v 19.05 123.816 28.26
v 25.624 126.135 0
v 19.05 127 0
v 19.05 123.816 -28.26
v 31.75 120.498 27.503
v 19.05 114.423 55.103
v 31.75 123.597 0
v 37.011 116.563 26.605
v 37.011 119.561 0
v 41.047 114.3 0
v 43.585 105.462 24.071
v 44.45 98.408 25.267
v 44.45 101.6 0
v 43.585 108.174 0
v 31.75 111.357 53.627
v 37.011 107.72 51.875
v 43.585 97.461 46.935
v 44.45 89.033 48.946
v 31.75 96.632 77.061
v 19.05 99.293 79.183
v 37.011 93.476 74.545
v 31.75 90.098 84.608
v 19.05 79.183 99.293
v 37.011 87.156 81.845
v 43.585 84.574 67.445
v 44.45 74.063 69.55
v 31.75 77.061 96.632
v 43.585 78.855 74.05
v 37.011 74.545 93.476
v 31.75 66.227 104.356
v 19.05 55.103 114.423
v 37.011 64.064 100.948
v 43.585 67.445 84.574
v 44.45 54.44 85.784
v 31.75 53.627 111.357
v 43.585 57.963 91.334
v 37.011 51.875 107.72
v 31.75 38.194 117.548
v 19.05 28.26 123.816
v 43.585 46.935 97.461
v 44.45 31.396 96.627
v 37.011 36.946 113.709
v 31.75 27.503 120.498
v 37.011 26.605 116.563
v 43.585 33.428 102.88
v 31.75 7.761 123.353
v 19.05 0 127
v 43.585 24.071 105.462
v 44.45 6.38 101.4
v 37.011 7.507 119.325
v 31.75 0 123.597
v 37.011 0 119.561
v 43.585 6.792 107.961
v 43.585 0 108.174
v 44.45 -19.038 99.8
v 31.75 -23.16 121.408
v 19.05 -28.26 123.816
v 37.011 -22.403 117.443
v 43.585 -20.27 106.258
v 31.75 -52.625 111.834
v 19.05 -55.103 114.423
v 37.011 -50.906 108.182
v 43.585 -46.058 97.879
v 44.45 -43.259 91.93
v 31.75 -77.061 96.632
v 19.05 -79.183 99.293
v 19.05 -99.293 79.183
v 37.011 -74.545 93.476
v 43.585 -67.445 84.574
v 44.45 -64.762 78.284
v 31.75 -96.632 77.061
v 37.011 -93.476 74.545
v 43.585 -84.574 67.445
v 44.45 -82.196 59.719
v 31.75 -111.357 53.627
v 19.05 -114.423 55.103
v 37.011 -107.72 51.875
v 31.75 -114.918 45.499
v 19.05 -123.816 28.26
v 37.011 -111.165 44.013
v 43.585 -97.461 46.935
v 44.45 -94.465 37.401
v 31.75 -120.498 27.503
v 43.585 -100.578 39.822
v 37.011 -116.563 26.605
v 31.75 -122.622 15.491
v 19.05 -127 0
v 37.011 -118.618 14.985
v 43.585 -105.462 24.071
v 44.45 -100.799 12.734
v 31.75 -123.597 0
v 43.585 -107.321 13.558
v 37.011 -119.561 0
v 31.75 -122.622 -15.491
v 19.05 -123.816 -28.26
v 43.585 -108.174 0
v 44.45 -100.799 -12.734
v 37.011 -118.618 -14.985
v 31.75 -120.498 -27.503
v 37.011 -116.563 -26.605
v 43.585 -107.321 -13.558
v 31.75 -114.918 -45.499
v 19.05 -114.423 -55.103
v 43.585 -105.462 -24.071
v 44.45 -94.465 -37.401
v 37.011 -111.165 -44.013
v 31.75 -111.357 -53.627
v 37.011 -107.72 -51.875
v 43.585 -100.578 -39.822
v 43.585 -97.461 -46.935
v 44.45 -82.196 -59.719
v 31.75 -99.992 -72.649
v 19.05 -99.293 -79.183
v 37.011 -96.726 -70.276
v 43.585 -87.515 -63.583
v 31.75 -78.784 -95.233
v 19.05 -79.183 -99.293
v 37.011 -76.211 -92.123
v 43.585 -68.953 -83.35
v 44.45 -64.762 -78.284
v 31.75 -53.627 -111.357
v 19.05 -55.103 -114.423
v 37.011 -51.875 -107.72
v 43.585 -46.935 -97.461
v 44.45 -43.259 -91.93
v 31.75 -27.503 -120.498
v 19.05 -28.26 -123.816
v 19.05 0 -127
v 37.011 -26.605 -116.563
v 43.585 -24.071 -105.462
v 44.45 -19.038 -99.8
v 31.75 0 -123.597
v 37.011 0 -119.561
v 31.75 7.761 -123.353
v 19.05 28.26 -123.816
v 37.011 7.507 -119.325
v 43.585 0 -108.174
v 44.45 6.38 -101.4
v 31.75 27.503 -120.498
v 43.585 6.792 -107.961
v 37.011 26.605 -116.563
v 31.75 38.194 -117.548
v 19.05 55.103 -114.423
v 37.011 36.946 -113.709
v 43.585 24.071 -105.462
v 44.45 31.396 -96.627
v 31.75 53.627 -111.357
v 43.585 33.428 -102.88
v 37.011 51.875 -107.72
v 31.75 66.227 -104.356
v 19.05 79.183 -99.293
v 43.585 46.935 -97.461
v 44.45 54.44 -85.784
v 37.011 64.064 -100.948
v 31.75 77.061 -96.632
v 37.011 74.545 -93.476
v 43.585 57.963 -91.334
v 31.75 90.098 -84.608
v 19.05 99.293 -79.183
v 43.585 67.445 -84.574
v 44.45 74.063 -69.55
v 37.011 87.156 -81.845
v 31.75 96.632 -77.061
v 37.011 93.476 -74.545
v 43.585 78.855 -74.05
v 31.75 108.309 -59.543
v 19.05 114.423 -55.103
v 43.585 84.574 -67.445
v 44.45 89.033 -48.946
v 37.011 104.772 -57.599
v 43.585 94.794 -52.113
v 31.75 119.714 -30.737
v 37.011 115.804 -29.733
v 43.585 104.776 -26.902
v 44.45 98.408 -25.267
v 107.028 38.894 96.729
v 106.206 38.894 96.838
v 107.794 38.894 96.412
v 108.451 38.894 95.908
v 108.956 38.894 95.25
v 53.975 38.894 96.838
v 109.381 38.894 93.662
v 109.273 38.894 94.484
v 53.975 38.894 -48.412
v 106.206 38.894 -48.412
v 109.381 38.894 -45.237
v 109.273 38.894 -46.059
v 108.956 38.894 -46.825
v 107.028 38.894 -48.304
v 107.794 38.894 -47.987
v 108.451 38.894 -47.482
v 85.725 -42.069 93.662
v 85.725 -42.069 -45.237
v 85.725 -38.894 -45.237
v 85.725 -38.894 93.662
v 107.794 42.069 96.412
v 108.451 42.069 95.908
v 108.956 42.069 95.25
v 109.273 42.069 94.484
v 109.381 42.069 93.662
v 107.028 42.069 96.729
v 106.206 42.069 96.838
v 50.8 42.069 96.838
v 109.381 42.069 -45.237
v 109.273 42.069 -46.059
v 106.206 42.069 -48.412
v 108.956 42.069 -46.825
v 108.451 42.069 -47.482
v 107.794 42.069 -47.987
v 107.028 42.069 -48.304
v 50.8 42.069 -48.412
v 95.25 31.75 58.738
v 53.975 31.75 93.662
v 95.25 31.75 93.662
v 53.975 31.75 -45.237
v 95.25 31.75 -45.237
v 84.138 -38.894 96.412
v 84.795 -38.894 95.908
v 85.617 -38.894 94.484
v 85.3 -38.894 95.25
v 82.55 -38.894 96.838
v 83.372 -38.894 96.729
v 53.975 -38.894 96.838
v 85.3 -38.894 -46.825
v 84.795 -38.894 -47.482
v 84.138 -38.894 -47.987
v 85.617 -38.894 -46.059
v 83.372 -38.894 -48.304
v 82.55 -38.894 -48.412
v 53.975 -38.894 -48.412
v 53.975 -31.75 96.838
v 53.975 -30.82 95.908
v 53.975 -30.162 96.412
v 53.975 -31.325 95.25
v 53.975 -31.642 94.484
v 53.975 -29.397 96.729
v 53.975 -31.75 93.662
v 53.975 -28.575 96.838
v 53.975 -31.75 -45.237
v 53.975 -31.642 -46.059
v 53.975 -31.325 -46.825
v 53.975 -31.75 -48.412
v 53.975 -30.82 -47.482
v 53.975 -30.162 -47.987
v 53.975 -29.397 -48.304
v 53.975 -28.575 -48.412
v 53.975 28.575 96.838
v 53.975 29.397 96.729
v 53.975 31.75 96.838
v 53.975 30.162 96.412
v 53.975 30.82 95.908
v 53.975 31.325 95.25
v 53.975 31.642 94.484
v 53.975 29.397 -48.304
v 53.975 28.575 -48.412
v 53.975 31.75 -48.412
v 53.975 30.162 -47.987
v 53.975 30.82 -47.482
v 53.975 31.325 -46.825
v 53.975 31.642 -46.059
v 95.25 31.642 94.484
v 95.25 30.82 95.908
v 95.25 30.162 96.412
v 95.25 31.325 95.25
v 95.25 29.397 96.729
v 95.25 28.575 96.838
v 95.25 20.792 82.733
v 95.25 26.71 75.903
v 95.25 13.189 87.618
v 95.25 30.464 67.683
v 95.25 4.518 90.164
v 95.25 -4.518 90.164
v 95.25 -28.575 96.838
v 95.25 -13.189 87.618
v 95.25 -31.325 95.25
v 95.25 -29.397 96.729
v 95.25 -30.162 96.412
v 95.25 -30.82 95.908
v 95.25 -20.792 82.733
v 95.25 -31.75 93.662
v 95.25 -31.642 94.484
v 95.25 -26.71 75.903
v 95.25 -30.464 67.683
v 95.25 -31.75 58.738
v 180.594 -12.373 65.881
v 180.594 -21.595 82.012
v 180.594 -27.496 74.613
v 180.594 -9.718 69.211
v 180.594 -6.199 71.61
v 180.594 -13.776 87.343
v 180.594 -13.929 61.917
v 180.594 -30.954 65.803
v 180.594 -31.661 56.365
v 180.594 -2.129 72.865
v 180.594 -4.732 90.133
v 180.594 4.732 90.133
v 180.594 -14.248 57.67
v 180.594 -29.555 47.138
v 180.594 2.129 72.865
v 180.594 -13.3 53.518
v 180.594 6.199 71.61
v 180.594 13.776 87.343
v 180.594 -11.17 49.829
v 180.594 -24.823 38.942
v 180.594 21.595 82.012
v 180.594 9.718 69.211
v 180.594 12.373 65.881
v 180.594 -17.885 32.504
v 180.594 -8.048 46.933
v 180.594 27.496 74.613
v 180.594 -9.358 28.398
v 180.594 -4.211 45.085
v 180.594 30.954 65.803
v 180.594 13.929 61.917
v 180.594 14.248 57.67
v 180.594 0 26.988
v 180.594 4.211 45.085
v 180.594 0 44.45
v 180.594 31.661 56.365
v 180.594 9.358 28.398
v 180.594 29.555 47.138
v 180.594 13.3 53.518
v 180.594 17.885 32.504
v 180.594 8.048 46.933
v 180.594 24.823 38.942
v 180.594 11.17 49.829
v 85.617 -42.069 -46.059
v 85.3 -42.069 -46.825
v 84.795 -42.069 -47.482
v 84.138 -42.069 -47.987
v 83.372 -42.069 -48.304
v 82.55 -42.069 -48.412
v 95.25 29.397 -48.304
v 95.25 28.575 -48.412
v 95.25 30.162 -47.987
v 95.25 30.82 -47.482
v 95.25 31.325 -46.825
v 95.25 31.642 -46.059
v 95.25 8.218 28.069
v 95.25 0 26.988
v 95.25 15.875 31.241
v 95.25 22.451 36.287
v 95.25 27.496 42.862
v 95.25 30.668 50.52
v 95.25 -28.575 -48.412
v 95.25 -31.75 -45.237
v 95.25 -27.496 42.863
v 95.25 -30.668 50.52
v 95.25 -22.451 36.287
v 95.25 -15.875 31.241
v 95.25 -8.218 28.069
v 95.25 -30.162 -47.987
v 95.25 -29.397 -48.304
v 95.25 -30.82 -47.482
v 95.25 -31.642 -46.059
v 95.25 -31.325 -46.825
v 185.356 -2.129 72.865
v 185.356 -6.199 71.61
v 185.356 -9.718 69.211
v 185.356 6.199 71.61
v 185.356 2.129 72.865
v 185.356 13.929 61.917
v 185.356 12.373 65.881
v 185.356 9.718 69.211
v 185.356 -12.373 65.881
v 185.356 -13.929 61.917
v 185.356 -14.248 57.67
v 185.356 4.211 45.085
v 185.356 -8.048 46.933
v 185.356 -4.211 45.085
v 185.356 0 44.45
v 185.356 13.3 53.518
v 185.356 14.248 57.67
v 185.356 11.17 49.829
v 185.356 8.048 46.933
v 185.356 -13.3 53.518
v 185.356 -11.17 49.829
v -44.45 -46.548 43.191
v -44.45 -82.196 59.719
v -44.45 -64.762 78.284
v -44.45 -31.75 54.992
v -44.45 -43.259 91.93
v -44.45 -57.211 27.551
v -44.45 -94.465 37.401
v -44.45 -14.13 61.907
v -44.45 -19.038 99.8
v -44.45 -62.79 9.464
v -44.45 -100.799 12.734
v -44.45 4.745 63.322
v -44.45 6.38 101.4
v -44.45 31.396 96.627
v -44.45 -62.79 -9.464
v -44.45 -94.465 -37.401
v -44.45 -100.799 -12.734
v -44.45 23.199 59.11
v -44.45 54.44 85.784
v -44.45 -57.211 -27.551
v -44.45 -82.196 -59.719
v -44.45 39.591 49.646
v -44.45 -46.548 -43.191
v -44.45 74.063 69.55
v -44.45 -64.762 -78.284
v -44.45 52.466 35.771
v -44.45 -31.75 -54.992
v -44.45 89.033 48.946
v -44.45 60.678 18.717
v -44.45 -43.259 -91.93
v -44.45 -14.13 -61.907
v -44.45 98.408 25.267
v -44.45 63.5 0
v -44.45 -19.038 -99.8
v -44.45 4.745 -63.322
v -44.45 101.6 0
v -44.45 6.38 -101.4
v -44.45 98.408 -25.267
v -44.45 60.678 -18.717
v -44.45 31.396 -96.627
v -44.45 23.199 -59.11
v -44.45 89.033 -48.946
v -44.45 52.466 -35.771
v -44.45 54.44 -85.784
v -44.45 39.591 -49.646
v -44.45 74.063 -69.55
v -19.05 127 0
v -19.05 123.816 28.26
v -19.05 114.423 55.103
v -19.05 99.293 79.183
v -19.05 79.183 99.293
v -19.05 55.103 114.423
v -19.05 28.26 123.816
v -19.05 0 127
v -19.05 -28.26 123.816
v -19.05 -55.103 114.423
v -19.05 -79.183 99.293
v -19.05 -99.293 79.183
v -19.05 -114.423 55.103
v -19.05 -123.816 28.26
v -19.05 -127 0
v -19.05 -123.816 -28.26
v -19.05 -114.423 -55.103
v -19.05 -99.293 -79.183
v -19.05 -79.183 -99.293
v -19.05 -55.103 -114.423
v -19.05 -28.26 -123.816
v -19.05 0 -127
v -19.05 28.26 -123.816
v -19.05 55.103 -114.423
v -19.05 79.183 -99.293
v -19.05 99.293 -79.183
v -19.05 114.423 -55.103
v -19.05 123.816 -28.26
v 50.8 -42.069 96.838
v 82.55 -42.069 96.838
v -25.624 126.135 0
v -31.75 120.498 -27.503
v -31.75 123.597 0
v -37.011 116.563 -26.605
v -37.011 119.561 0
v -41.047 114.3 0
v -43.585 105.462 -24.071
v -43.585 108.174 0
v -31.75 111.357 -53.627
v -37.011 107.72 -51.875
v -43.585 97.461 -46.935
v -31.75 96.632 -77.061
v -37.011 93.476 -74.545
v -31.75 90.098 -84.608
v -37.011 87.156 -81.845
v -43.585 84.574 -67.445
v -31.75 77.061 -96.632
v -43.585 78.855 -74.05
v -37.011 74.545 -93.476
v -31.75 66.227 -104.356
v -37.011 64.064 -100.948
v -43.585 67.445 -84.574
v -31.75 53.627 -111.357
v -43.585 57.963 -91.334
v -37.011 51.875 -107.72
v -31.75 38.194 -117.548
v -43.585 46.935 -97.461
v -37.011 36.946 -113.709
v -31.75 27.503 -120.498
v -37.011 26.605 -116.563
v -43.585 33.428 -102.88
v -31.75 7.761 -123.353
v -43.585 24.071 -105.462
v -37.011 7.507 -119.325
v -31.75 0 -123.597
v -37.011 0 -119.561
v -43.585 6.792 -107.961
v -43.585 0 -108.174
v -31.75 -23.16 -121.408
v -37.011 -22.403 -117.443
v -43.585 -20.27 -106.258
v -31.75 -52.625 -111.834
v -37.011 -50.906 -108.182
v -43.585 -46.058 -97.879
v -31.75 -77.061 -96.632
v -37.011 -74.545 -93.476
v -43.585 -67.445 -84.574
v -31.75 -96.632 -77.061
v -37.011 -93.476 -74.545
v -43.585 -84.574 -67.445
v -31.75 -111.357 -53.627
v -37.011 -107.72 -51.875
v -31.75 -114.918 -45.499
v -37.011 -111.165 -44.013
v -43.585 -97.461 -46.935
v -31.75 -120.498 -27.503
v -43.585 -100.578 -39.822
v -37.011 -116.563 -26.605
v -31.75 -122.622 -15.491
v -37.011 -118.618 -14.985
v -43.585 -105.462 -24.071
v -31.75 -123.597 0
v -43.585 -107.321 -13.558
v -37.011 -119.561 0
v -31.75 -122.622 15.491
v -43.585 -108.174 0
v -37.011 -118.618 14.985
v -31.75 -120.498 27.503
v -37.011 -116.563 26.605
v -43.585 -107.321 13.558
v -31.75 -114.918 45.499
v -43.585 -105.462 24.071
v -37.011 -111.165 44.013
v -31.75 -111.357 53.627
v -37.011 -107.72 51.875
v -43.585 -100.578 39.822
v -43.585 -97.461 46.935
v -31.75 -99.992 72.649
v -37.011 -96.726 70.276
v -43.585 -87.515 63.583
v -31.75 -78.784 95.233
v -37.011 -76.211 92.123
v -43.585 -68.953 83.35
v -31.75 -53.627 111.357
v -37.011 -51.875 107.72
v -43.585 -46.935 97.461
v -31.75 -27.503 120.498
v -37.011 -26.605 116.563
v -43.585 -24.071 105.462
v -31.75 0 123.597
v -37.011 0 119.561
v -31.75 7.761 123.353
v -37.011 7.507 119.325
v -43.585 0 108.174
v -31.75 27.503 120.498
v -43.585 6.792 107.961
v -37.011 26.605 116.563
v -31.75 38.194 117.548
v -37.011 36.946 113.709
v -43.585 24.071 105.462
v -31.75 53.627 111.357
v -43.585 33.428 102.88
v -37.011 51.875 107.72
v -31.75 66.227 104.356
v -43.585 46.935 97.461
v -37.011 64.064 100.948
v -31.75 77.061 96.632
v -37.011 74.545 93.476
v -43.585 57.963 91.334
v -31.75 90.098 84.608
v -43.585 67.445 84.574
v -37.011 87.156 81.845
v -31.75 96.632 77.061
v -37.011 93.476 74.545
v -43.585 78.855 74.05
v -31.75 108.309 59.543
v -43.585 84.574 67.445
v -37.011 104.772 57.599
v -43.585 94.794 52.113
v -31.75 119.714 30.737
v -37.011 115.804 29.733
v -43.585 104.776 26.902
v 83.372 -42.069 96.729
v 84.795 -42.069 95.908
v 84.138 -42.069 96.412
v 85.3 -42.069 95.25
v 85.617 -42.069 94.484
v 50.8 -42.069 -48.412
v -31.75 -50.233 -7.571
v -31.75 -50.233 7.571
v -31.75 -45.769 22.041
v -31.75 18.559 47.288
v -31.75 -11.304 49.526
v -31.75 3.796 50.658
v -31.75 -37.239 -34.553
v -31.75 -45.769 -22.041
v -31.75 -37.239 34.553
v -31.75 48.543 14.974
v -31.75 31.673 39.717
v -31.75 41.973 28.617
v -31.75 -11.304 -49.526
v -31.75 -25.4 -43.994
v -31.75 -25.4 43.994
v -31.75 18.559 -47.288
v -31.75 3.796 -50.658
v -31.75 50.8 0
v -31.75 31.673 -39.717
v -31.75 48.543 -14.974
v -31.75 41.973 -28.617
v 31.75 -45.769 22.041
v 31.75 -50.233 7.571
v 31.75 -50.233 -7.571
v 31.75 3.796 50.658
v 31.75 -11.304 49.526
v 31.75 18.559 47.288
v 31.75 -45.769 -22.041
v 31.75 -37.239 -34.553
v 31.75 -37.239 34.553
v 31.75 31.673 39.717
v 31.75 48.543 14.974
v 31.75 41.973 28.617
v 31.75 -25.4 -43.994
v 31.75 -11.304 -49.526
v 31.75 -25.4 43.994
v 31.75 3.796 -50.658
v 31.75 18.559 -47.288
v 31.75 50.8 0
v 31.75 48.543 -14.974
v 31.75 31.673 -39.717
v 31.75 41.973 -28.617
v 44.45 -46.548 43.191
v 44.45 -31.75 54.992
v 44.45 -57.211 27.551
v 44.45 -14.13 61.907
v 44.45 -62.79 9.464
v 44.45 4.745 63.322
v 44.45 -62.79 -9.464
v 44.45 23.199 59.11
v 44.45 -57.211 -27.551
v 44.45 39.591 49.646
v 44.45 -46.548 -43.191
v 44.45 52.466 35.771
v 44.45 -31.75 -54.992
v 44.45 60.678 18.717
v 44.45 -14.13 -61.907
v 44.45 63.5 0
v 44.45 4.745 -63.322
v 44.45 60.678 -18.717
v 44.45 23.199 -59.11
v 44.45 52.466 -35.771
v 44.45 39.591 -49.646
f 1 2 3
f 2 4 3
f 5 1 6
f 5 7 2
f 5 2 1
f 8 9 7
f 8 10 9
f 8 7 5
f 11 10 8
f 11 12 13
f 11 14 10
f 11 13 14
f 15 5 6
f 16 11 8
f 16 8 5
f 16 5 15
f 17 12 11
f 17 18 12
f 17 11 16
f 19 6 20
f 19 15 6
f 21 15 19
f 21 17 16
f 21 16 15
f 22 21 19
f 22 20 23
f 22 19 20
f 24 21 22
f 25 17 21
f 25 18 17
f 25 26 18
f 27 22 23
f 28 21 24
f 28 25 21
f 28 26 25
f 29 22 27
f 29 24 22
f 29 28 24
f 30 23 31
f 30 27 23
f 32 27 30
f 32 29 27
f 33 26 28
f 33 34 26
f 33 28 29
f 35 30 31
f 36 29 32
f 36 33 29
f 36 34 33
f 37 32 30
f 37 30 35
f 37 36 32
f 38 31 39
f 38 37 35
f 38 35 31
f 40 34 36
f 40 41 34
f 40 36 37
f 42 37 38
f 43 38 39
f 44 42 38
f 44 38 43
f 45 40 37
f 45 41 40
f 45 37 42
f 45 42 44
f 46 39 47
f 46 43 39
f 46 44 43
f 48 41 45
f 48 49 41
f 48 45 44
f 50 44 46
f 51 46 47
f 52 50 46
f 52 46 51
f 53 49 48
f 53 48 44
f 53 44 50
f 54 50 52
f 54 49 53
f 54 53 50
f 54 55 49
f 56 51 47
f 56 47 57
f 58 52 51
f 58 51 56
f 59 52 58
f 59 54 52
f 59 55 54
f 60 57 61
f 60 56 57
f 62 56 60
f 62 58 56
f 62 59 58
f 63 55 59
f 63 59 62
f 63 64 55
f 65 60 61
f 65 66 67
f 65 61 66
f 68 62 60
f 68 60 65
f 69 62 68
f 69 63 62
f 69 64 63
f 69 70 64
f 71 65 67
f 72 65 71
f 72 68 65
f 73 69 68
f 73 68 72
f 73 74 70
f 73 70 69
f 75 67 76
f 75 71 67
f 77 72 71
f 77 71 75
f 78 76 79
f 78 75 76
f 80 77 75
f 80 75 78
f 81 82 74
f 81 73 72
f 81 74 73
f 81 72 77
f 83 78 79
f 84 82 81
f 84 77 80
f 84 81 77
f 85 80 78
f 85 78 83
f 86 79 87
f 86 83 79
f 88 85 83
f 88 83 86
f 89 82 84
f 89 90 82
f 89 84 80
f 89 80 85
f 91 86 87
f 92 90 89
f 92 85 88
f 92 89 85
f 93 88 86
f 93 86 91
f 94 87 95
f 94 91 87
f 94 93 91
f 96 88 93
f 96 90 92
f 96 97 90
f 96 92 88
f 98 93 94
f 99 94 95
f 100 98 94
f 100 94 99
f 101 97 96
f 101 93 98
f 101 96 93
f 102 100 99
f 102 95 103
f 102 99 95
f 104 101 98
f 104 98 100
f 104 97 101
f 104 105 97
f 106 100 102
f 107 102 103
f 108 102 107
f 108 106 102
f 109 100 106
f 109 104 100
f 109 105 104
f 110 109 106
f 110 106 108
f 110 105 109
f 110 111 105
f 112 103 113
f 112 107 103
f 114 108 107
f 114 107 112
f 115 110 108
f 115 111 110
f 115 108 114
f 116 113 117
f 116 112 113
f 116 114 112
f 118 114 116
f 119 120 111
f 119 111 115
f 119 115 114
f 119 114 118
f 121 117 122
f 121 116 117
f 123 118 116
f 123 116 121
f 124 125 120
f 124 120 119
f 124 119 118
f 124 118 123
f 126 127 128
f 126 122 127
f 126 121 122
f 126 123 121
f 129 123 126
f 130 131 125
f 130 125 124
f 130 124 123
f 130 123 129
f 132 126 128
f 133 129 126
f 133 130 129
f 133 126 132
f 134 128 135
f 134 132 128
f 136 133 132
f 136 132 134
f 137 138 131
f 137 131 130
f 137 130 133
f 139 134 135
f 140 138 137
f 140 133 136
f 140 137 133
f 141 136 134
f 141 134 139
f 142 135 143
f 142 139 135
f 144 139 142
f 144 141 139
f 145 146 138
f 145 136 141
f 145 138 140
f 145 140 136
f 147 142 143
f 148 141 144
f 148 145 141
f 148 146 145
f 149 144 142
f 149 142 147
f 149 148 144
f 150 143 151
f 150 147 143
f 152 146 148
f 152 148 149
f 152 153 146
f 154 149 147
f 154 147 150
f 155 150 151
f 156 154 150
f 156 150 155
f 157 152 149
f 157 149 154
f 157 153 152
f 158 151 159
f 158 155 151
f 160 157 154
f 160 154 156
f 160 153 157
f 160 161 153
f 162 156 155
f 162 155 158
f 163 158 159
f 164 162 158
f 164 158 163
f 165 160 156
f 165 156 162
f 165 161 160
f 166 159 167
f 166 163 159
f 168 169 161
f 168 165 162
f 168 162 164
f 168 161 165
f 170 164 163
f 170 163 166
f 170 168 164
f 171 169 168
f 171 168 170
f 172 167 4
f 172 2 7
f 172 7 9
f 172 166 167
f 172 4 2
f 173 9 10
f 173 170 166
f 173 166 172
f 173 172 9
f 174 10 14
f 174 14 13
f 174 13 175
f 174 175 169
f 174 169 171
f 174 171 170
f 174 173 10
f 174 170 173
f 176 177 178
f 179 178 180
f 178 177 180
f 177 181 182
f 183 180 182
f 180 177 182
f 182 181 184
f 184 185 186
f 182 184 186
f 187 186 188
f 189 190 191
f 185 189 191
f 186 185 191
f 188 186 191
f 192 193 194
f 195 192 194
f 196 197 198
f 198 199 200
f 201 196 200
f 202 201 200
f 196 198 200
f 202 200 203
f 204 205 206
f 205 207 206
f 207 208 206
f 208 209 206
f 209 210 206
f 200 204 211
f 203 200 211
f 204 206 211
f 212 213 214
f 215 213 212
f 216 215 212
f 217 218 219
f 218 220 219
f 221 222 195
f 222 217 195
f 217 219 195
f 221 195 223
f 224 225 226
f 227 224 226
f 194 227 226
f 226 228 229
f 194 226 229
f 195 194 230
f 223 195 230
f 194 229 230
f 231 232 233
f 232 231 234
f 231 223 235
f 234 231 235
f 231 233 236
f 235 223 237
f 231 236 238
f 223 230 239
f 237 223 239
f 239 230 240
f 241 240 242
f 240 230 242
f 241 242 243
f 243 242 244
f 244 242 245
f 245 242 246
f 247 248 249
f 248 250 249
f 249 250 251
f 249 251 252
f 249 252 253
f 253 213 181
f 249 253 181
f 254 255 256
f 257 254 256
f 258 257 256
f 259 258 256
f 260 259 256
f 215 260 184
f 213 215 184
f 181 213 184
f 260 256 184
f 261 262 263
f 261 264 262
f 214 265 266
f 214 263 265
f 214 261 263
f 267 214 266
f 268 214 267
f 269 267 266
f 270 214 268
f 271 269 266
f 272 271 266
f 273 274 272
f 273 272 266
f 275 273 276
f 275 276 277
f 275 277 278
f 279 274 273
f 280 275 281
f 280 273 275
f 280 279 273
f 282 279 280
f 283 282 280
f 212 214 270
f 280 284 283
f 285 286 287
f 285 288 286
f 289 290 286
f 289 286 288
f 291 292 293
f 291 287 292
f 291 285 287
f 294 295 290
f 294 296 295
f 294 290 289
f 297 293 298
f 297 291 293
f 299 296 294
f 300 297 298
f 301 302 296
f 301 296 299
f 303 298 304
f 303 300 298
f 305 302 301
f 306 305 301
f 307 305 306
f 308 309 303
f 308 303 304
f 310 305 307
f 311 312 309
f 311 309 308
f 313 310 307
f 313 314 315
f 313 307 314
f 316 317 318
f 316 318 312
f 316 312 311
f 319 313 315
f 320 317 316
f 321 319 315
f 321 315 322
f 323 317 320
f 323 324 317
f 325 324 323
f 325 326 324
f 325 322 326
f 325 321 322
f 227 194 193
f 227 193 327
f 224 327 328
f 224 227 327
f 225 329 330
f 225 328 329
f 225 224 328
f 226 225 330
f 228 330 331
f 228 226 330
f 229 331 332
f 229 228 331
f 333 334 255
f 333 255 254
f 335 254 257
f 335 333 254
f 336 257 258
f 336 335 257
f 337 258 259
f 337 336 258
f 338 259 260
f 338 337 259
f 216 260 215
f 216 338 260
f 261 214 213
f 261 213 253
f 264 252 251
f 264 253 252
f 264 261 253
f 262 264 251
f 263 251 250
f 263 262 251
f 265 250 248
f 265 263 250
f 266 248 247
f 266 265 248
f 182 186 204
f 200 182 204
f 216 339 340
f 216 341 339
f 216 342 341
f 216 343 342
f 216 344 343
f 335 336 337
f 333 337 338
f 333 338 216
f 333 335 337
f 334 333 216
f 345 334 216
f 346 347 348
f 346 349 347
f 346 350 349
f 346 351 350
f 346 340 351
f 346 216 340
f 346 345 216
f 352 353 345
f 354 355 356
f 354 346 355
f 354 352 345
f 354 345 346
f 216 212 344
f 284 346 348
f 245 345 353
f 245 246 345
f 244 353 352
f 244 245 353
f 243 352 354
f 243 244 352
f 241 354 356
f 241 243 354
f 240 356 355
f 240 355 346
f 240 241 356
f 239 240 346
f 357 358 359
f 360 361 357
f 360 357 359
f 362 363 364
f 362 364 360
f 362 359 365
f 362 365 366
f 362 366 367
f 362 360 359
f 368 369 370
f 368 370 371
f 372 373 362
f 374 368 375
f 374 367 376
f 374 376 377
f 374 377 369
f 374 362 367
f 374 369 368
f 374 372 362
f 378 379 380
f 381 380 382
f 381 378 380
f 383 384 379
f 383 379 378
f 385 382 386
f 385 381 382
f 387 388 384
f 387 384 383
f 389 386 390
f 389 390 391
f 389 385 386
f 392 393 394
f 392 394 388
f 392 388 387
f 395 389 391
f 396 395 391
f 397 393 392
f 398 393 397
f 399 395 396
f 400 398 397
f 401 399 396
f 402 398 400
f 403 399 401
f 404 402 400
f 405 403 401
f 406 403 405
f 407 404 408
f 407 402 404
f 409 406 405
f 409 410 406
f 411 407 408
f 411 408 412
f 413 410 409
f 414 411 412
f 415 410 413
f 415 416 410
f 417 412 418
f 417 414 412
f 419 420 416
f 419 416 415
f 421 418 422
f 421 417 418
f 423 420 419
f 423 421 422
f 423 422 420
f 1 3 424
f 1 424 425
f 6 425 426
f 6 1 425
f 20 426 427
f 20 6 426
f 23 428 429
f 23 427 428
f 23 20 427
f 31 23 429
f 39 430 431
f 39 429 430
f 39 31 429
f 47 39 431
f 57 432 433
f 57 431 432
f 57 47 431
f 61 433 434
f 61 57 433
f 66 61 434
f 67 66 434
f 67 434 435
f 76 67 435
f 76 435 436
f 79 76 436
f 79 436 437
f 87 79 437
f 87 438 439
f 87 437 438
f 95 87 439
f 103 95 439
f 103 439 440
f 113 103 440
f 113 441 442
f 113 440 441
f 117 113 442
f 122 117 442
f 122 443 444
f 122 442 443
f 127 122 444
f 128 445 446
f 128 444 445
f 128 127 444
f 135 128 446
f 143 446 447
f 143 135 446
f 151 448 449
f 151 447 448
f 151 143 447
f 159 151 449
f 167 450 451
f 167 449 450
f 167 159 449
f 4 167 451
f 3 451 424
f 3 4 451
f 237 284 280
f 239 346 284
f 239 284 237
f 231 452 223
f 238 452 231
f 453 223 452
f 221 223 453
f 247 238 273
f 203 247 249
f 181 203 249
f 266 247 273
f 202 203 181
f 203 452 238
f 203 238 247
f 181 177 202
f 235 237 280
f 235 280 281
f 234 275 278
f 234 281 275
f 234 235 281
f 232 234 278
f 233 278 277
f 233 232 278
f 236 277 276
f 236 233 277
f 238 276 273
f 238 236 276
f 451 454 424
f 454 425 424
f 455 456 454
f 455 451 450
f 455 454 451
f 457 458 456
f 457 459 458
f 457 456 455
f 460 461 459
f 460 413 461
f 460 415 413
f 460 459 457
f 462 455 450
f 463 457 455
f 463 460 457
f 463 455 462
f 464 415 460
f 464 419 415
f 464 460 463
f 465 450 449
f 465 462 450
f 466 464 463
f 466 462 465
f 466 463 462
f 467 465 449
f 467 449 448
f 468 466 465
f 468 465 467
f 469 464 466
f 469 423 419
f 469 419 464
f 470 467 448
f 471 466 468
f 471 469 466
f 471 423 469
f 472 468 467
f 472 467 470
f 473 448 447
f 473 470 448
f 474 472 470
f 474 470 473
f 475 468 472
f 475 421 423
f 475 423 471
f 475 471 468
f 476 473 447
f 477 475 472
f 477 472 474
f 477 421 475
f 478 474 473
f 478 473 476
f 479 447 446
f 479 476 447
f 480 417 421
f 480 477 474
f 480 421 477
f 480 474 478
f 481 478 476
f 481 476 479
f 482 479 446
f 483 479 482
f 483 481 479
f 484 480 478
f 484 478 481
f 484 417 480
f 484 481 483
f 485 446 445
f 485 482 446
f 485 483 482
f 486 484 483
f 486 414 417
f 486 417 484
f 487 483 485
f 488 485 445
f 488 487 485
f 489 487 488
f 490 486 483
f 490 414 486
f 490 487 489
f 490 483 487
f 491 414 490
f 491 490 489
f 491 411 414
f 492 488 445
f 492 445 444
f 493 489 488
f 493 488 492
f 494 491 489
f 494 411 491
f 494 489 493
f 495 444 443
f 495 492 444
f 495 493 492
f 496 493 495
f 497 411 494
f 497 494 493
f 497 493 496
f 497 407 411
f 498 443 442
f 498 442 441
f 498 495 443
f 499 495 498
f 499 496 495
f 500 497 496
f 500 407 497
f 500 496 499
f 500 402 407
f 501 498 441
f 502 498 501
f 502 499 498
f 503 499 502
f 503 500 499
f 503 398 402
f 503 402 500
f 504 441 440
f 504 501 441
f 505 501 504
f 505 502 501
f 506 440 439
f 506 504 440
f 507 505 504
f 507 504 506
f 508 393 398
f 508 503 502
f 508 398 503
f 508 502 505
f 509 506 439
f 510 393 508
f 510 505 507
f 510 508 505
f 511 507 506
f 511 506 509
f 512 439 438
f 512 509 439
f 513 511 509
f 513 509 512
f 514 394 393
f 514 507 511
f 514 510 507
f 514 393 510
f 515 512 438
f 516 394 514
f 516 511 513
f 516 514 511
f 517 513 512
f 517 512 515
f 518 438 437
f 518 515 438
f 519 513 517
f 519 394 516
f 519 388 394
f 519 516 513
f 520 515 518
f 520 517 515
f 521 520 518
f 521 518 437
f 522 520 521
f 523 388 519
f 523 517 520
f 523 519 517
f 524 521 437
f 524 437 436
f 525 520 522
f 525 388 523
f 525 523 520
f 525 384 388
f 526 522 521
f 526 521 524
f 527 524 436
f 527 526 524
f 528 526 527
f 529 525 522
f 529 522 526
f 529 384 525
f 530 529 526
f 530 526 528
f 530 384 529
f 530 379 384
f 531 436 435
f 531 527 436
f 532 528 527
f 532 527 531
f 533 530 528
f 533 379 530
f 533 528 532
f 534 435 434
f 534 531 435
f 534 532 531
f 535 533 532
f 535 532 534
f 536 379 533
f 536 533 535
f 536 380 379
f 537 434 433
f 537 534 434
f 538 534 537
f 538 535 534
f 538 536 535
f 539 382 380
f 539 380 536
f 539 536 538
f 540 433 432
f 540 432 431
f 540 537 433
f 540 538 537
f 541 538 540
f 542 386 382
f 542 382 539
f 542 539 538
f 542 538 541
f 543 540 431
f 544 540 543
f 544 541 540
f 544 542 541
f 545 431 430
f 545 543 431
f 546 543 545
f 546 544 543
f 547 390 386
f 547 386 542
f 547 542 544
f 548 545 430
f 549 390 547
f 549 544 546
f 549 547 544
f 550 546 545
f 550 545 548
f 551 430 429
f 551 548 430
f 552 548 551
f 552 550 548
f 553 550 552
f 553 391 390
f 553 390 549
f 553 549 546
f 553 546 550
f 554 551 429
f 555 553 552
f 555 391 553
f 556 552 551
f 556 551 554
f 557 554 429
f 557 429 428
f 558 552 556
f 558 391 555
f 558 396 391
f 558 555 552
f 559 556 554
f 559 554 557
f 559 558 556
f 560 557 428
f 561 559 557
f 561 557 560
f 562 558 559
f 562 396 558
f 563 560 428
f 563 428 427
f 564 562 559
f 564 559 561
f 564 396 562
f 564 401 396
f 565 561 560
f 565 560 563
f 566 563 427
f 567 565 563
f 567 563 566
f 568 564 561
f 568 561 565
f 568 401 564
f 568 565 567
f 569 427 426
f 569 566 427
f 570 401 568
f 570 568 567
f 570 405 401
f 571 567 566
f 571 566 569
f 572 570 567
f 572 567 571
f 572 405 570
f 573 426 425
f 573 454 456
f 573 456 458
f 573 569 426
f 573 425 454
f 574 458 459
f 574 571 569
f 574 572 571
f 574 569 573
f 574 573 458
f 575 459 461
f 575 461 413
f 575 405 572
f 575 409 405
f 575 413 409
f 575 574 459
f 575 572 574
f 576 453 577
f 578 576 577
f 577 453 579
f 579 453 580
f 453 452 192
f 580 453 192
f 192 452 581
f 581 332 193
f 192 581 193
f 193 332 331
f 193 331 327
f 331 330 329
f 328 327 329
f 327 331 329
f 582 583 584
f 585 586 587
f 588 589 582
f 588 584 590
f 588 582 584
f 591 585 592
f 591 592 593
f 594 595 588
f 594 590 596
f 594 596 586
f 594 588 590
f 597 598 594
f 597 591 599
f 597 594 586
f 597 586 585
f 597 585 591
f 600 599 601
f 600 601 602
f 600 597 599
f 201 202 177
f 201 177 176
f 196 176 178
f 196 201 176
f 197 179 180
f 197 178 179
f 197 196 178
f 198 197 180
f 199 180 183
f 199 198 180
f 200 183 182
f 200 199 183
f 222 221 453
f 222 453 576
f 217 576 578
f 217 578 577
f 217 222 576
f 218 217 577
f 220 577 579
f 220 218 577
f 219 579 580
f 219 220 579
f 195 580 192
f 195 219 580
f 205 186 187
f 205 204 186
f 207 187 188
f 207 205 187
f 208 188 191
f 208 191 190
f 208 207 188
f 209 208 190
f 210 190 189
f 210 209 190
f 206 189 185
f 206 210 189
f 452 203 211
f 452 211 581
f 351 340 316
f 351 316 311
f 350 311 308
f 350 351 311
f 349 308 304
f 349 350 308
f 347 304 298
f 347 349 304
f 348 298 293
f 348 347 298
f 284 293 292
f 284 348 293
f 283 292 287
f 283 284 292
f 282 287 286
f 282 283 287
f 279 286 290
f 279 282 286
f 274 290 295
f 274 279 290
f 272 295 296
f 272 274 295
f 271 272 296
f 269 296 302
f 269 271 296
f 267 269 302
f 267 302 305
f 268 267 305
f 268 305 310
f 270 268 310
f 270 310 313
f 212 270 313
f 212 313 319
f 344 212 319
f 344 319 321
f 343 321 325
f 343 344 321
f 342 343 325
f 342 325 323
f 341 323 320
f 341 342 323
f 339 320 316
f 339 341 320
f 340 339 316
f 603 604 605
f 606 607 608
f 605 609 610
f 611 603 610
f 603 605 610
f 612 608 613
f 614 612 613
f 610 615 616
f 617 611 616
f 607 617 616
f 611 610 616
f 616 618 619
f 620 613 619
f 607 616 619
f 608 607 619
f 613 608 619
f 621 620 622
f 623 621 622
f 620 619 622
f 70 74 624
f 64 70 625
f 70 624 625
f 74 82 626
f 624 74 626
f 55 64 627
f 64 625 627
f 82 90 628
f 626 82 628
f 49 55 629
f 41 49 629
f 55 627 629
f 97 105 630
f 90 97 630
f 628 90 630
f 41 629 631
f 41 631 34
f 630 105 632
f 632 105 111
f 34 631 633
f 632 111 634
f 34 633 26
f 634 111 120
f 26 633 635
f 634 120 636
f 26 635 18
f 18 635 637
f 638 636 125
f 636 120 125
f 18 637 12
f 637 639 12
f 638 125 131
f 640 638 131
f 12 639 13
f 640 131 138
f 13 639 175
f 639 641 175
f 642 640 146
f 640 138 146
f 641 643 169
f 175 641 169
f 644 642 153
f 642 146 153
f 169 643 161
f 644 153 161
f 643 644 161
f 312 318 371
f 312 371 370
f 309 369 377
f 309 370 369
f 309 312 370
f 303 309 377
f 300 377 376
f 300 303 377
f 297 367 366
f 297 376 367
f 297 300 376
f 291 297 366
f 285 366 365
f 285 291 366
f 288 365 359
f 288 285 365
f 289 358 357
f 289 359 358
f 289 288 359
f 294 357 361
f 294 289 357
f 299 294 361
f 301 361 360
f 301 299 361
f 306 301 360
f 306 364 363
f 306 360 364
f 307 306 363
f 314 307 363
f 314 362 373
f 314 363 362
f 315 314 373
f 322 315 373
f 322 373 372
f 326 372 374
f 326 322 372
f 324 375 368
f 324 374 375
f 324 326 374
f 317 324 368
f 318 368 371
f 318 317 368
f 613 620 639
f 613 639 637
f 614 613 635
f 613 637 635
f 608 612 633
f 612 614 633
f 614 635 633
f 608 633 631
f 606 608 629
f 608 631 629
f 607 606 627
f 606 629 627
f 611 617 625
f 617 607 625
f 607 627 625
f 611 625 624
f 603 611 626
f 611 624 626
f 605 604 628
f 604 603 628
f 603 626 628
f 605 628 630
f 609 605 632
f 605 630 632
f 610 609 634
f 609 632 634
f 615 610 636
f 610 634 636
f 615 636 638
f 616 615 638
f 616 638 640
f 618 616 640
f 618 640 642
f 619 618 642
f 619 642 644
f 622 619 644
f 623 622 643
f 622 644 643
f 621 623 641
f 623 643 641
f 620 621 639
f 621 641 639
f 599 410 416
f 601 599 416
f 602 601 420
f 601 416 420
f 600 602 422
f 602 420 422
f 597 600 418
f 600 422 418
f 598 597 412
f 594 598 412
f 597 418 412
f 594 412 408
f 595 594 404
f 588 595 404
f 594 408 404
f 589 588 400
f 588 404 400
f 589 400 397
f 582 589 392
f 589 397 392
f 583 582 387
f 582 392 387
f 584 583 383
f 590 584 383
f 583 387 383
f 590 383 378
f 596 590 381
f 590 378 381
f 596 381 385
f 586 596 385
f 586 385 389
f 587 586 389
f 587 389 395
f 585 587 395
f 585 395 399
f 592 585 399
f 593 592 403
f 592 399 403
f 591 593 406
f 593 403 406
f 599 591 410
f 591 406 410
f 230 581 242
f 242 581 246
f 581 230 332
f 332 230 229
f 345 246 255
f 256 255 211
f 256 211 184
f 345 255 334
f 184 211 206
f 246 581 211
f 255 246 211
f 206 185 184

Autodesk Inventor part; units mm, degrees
ref_plane "YZ Plane" through (0, 0, 0) normal (1, 0, 0) x (0, 1, 0)
ref_plane "XZ Plane" through (0, 0, 0) normal (0, 1, 0) x (-1, 0, 0)
sketch "Sketch1" plane through (0, 0, 0) normal (0, 0, 1) x (1, 0, 0)
  line L0 (-44.45, 127) -> (44.45, 127)
  line L1 (44.45, 127) -> (44.45, 50.8)
  line L2 (-44.45, 50.8) -> (-44.45, 127)
  line L3 (31.75, 50.8) -> (31.75, 0)
  line L4 (31.75, 0) -> (-31.75, 0)
  line L5 (-31.75, 0) -> (-31.75, 50.8)
  line L6 (-44.45, 50.8) -> (-31.75, 50.8)
  line L7 (31.75, 50.8) -> (44.45, 50.8)
  line L8 (152.4, 0) -> (-152.4, 0) construction
  point P0 (0, 0)
  dimension "d0" = 88.9
  dimension "d1" = 76.2
  dimension "d3" = 44.45
  dimension "d4" = 63.5
  dimension "d12" = 152.4
  dimension "d13" = 152.4
revolve "Snow Blower Tire" add sketch "Sketch1" angle 360 about axis through (31.75, 0, 0) along (-1, 0, 0)
fillet "Fillet1" radius 25.4 2 edges at (44.45, -127, 0) (-44.45, -127, 0)
chamfer "Chamfer1" distance 12.7 angle 45 2 edges at (44.45, -50.8, 0) (-44.45, -50.8, 0)
sketch "Sketch2" plane through (0, 0, 0) normal (0, 0, 1) x (1, 0, 0)
  line L0 (50.8, 42.0687) -> (50.8, -42.0688)
  line L1 (50.8, -42.0688) -> (85.725, -42.0688)
  line L2 (85.725, -42.0688) -> (85.725, -38.8938)
  line L3 (85.725, -38.8938) -> (53.975, -38.8938)
  line L4 (53.975, -38.8938) -> (53.975, -31.75)
  line L5 (53.975, 38.8937) -> (109.3812, 38.8938)
  line L6 (109.3812, 38.8938) -> (109.3812, 42.0688)
  line L7 (109.3812, 42.0688) -> (50.8, 42.0687)
  line L8 (-86.9955, 0) -> (165.7829, 0) construction
  line L9 (0, -177.8) -> (0, 177.8) projected
  line L10 (53.975, 31.75) -> (95.25, 31.75)
  line L11 (95.25, 31.75) -> (95.25, -31.75)
  line L12 (95.25, -31.75) -> (53.975, -31.75)
  line L13 (53.975, 31.75) -> (53.975, 38.8937)
  line L14 (53.975, 38.8937) -> (50.8, 38.8937) construction
  point P0 (0, 0)
  dimension "d14" = 84.1375
  dimension "d15" = 34.925
  dimension "d16" = 3.175
  dimension "d19" = 42.0688
  dimension "d23" = 50.8
  dimension "d28" = 41.275
  dimension "d29" = 63.5
extrude "Gearbox" add sketch "Sketch2" along normal blind 96.8375 and the other way blind 48.4124
sketch "Sketch6" plane through (95.25, -31.75, 96.8375) normal (1, 0, 0) x (0, 0, -1)
  line L0 (0, 0) -> (0, 63.5) projected
  line L1 (145.2499, 63.5) -> (0, 63.5) projected
  line L2 (145.2499, 0) -> (0, 0) projected
  line L3 (145.2499, 63.5) -> (145.2499, 0) projected
  line L4 (0, 31.75) -> (145.2499, 31.75) construction
  line L5 (38.1, 63.5) -> (38.1, 0) construction
  circle A0 centre (38.1, 31.75) radius 31.75
  point P0 (96.8375, 31.75)
  dimension "d40" = 38.1
  dimension "d41" = 63.5
extrude "CIM" add sketch "Sketch6" along normal blind 85.344 contours A0
sketch "Sketch7" plane through (180.594, 0, 58.7375) normal (1, 0, 0) x (0, 0, -1)
  circle A0 centre (0, 0) radius 14.2875
  point P0 (58.7375, 0)
  dimension "d44" = 28.575
extrude "Extrusion6" add sketch "Sketch7" along normal blind 4.7625
sketch "Sketch8" plane through (50.8, 42.0688, 96.8375) normal (0, 1, 0) x (1, 0, 0)
  line L0 (-31.75, -30.1625) -> (-31.75, 223.8375) projected
  line L1 (-31.75, -30.1625) -> (-31.75, 223.8375) projected
  line L2 (-69.85, 223.8375) -> (-69.85, -30.1625) projected
  line L3 (-144.3028, 96.8375) -> (140.0403, 96.8375) construction
  line L4 (58.5812, 145.2499) -> (58.5812, 0) projected
  line L5 (46.2781, 104.5566) -> (46.2781, 86.4461) construction
  point P0 (-50.8, 96.8375)
  point P1 (46.2781, 96.8375)
  point P2 (46.2781, 96.8375)
  dimension "d69" = 12.3031
  dimension "d70" = 48.4124
fillet "Fillet3" radius 3.175 8 edges at (109.3812, 40.4813, 96.8375) (109.3812, 40.4813, -48.4124) (85.725, -40.4813, 96.8375) (85.725, -40.4813, -48.4124) (74.6125, 31.75, 96.8375) (74.6125, -31.75, 96.8375) (74.6125, -31.75, -48.4124) (74.6125, 31.75, -48.4124)
ref_plane "Work Plane6" through (-93.5028, 42.0687, 0) normal (0, 0, 1) x (1, 0, 0)
sketch "Sketch16" plane through (-93.5028, 42.0687, 0) normal (0, 0, 1) x (1, 0, 0)
  line L0 (190.5809, 0) -> (165.1809, -82.55)
  line L1 (165.1809, -82.55) -> (190.5809, -82.55)
  line L2 (190.5809, -82.55) -> (190.5809, 0)
  line L3 (49.0528, -143.6688) -> (49.0528, 59.5312) construction
  line L4 (74.4528, 84.9312) -> (74.4528, -169.0687) construction
  line L5 (74.4528, 84.9312) -> (112.5528, 84.9312) construction
  point P0 (93.5028, -42.0688)
  dimension "d71" = 82.55
  dimension "d72" = 25.4
  dimension "d77" = 141.5281
ref_plane "Kingpin Top" through (97.0781, 42.0688, 0) normal (-0.2941, -0.9558, 0) x (0.9558, -0.2941, 0)
sketch "Sketch17" plane through (97.0781, 42.0688, 0) normal (-0.2941, -0.9558, 0) x (0.9558, -0.2941, 0)
  line L0 (0, 0) -> (0, -10.9395)
  line L1 (0, 0) -> (0, 10.9068)
  point P0 (-80.4134, 0)
sketch "Sketch18" plane through (0, 0, 0) normal (1, 0, 0) x (0, 1, 0)
  line L0 (42.0688, -48.4124) -> (42.0688, 96.8375) construction
  circle A0 centre (0, 0) radius 127 construction
  line L1 (-127, 0) -> (-127, -102.7514) construction
  point P0 (0, 0)
  dimension "d76" = 169.0687
equation "\"d19\" = 0.5 * d14"
properties part number "Snow Tire Wheel with Gearbox and CIM"
